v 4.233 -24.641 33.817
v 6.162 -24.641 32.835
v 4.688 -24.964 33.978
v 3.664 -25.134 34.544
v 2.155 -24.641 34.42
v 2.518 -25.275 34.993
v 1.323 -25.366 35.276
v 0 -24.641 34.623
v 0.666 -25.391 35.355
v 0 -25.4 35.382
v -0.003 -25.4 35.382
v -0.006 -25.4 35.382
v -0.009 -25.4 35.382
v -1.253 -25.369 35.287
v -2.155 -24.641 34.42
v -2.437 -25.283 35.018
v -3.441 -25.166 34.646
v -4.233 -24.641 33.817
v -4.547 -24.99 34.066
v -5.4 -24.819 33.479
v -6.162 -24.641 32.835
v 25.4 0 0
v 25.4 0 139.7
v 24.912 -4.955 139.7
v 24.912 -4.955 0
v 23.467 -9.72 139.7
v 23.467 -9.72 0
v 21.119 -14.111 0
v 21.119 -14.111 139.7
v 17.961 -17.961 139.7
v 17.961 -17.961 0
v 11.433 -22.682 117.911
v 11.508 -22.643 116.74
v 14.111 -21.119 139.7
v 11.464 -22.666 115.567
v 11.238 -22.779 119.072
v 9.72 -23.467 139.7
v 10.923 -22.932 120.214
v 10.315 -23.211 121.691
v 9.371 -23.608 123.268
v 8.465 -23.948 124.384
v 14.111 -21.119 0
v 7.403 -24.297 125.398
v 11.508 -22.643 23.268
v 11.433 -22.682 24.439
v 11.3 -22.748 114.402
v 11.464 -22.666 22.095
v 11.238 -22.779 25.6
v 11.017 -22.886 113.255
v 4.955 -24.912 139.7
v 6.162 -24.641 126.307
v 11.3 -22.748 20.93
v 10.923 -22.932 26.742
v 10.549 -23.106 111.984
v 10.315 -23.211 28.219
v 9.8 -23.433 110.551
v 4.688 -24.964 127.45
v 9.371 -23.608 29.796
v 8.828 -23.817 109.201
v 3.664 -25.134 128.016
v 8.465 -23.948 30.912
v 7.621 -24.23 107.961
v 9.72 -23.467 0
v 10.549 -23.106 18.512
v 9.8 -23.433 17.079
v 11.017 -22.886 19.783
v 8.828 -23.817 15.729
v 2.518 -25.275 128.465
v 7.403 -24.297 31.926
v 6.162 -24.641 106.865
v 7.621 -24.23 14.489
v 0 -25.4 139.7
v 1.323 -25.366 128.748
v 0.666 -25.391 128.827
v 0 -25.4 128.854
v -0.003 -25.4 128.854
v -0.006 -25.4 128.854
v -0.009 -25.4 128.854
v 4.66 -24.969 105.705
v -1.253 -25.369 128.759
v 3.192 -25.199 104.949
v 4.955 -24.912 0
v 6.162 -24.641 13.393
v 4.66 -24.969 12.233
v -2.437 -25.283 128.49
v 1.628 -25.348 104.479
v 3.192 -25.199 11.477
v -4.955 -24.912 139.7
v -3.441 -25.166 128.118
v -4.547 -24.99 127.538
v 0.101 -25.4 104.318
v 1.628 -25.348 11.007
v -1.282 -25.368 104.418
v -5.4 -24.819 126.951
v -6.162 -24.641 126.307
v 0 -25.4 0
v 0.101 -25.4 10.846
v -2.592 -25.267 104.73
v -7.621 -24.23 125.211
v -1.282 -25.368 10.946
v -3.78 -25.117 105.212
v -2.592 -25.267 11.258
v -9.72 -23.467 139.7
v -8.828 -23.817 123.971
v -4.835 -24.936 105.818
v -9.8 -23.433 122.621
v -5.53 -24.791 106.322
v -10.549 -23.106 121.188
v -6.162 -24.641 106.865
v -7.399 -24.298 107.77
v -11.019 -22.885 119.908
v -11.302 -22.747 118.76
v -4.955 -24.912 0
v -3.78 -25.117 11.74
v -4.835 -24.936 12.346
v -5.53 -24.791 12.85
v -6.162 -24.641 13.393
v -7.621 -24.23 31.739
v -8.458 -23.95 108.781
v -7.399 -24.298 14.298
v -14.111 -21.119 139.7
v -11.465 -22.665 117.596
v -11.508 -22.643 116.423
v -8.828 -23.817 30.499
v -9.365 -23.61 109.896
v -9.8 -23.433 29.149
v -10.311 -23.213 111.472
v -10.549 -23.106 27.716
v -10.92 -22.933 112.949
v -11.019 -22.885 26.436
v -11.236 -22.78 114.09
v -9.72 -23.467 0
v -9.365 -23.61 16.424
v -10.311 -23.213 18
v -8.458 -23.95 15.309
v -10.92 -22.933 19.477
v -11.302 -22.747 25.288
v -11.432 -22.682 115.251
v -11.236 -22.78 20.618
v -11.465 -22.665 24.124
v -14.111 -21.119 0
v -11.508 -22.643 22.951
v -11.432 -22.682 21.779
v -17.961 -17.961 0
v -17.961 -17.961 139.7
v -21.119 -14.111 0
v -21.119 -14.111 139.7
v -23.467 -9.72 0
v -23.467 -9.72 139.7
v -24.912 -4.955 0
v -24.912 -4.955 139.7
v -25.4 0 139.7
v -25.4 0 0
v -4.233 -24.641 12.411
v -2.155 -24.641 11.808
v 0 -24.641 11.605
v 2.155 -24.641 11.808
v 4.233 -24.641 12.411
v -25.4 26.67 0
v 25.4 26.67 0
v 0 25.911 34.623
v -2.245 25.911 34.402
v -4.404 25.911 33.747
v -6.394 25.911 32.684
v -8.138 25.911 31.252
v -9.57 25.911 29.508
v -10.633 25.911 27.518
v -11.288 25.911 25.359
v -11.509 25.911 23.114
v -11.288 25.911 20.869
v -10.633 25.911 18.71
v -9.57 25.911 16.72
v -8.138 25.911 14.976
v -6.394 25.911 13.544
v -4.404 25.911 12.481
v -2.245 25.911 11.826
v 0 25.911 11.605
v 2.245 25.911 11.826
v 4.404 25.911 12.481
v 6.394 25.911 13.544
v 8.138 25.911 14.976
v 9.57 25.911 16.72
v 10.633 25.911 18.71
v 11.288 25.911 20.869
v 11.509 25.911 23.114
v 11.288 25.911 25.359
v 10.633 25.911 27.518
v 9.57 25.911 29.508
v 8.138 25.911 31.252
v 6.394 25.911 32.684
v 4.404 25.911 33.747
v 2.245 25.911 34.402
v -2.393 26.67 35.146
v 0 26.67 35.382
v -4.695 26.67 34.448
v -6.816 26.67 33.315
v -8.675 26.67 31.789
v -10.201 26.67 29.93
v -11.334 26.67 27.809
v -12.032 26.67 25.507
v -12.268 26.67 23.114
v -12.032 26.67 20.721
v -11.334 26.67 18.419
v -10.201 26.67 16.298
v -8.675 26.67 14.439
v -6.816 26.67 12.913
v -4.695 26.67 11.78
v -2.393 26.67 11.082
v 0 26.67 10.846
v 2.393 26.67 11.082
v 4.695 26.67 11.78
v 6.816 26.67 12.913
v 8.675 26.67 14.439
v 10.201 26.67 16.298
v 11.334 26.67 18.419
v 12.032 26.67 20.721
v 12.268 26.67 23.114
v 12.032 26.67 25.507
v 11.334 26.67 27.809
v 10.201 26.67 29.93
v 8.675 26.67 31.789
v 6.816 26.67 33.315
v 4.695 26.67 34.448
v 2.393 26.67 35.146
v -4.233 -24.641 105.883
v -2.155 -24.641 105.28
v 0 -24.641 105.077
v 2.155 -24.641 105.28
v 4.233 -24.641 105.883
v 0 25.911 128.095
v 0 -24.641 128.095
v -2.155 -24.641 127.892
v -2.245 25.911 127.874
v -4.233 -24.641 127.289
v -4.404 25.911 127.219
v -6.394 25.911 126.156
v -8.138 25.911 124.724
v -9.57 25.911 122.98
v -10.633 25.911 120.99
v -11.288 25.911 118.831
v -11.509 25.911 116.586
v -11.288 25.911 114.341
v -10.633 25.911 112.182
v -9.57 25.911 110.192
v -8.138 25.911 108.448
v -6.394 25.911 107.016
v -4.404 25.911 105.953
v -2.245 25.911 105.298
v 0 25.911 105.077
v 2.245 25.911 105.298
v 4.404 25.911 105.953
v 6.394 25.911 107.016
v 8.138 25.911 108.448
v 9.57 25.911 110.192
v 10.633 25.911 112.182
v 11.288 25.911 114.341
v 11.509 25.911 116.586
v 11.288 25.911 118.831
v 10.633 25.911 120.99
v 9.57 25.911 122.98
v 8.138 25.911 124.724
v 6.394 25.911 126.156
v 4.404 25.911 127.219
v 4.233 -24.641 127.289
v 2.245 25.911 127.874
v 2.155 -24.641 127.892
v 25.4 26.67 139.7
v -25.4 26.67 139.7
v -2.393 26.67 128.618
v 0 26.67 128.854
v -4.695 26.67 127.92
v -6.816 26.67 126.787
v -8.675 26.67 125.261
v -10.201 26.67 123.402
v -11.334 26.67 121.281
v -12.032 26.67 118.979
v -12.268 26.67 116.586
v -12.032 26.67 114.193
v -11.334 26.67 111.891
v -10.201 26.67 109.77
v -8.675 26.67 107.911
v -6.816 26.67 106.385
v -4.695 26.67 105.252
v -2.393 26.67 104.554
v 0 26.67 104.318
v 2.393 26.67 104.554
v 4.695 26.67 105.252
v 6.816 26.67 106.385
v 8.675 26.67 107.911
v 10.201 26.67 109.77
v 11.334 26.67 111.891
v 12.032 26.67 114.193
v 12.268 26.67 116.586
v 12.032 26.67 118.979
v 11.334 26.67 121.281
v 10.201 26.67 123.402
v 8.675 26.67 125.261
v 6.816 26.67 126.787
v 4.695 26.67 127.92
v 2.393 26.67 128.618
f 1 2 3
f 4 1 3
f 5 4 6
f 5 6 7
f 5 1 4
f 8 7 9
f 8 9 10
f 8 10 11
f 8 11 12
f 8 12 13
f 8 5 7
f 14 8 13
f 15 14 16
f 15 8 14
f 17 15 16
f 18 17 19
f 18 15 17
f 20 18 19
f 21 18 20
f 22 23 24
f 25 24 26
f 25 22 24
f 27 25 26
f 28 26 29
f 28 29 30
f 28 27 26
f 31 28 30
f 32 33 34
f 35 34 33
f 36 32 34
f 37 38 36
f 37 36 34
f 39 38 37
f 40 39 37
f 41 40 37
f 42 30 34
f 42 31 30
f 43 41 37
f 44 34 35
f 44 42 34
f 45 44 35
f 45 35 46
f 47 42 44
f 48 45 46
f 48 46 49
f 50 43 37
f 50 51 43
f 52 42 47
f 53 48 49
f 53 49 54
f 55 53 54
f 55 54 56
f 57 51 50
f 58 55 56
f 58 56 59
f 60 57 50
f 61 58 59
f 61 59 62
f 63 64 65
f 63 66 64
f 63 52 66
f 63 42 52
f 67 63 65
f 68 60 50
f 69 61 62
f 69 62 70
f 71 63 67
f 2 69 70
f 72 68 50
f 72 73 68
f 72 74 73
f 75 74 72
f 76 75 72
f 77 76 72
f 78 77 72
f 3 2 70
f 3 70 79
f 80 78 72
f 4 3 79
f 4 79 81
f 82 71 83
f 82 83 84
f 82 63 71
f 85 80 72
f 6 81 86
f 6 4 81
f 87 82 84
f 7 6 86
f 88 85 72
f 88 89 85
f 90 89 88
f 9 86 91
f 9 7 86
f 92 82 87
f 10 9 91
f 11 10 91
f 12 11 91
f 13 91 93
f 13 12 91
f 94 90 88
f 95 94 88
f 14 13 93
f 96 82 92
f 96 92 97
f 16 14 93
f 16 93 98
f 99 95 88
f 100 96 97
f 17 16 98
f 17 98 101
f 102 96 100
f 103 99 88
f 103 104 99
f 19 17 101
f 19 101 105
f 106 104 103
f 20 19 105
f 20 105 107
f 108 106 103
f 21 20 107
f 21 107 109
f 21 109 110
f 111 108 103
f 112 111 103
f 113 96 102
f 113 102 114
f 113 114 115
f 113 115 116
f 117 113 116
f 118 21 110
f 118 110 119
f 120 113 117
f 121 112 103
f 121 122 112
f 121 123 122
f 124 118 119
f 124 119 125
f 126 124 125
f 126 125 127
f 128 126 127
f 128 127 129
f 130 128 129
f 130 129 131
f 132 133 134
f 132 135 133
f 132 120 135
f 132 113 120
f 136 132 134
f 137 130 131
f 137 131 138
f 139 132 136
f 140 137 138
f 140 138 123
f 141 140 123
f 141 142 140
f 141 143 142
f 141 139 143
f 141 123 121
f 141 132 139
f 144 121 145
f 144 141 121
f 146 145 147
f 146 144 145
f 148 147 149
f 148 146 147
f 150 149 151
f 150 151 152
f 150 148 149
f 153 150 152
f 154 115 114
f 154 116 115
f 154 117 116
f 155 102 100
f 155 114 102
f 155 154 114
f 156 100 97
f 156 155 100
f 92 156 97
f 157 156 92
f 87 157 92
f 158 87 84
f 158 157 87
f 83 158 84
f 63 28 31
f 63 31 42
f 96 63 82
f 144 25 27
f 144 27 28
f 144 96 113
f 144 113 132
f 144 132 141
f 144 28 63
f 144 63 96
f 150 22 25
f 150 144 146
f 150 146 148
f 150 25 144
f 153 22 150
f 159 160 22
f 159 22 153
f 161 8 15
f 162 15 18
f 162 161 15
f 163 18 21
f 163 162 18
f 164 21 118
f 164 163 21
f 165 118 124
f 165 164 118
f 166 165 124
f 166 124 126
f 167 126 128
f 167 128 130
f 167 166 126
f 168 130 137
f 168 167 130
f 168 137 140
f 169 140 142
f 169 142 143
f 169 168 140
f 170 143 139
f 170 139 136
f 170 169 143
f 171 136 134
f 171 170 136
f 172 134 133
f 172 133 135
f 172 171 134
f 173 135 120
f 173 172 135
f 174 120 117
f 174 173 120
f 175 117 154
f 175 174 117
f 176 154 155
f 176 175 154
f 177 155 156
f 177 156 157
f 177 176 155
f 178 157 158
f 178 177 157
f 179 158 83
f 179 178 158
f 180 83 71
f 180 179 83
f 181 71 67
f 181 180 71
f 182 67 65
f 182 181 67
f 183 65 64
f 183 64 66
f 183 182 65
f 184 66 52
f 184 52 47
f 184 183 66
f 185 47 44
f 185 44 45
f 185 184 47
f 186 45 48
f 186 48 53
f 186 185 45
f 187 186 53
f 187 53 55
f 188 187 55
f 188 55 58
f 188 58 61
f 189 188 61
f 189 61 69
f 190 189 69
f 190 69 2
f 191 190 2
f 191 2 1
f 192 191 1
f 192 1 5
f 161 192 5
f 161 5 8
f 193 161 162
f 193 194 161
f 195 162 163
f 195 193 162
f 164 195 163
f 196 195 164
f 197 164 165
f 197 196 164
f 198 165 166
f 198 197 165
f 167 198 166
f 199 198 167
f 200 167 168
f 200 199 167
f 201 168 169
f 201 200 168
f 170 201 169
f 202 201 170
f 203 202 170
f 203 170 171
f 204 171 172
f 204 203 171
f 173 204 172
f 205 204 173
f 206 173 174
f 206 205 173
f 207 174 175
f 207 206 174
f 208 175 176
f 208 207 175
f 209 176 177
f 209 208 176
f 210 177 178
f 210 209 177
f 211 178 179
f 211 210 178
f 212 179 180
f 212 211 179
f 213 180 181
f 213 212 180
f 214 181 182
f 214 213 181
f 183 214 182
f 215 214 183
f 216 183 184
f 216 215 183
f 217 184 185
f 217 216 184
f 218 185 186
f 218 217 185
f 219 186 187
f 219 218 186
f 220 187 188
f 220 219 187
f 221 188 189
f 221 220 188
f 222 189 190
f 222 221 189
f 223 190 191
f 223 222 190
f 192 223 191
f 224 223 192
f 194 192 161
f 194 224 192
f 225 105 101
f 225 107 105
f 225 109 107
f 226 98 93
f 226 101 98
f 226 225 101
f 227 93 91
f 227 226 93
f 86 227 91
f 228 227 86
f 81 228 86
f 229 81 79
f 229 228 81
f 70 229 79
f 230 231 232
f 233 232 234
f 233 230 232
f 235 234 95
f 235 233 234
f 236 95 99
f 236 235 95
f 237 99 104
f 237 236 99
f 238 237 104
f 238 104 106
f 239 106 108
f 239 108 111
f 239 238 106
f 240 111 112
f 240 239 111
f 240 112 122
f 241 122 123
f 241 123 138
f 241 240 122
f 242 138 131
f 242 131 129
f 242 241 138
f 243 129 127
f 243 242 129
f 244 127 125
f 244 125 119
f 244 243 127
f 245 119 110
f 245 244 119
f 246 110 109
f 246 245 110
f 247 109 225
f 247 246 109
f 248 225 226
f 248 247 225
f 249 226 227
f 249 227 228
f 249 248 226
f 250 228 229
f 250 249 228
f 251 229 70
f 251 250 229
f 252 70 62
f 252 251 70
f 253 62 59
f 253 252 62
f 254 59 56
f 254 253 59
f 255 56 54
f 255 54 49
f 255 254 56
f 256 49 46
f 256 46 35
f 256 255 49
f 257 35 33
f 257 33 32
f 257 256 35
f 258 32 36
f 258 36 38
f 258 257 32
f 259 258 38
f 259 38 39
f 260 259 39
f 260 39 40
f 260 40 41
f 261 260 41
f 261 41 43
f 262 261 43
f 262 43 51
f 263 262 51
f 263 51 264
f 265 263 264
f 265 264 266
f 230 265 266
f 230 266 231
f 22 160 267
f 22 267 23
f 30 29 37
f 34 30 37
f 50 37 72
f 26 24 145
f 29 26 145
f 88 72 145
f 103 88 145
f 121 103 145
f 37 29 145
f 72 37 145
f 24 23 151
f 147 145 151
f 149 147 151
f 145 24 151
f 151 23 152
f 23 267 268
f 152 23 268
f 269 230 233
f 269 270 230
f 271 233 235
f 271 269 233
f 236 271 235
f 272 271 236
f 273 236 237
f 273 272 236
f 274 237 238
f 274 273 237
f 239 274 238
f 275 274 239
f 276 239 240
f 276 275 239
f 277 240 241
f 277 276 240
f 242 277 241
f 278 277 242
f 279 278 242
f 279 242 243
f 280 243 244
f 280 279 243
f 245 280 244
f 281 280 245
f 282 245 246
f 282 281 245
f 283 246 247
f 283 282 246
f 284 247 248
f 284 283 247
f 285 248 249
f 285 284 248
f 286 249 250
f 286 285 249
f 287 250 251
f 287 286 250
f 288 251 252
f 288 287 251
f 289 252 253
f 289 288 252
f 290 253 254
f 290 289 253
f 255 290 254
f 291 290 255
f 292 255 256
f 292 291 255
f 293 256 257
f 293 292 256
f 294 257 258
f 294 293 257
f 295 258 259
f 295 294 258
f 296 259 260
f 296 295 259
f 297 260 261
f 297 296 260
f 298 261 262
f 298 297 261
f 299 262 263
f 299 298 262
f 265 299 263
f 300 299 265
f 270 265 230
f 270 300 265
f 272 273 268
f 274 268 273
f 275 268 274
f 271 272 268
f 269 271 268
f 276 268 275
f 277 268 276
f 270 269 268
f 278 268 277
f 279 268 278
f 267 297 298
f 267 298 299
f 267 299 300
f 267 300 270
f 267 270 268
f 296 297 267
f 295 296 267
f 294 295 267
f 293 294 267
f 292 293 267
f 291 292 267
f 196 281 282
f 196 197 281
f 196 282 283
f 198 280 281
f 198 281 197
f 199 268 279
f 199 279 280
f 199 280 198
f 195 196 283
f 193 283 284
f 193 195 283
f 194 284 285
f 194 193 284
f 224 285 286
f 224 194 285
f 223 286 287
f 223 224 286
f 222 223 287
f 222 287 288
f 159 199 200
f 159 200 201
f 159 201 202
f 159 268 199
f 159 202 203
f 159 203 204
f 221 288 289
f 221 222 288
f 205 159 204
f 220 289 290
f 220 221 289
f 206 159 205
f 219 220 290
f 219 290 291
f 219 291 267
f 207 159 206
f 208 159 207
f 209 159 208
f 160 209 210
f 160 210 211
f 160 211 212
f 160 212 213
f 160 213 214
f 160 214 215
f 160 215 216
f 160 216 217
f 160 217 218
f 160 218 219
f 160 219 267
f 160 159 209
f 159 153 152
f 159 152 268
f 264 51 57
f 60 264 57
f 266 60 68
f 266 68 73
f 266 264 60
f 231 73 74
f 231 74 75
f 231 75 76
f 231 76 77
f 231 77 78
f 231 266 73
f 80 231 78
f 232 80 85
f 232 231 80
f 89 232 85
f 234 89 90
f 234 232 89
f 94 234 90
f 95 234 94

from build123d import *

# Parameters (mm, degrees)
EXTRUDE1_DEPTH                            = 139.7
F_29_32_0_90625_DIAMETER_HOLE1_AT_2_COUNT = 2
F_29_32_0_90625_DIAMETER_HOLE1_AT_2_PITCH = 93.472


with BuildPart() as part:
    # Sketch1 → Extrude1 (new body)
    with BuildSketch(Plane.XY):
        with BuildLine():
            Line((-25.4, 0), (-25.4, 26.67))
            Line((-25.4, 26.67), (25.4, 26.67))
            Line((25.4, 26.67), (25.4, 0))
            ThreePointArc((25.4, 0), (0, -25.4), (-25.4, 0))
        make_face()
    extrude(amount=EXTRUDE1_DEPTH)

    # Sketch2 → 29/32 (0.90625) Diameter Hole1 (revolve, cut)
    with BuildSketch(Plane(origin=(0, 26.67, 23.114), x_dir=(0, 0, 1), z_dir=(1, 0, 0))):
        Polygon((0, 0), (0, 52.07), (12.2682, 52.07), (11.509375, 51.311175), (11.509375, 0.758825), (12.2682, 0), align=None)
    f_29_32_0_90625_diameter_hole1 = revolve(axis=Axis((0, 33.02, 23.114), (0, -1, 0)), mode=Mode.SUBTRACT)

    # 29/32 (0.90625) Diameter Hole1 at 2: 29/32 (0.90625) Diameter Hole1 ×2
    with Locations(*[(0, 0, i * F_29_32_0_90625_DIAMETER_HOLE1_AT_2_PITCH) for i in range(1, F_29_32_0_90625_DIAMETER_HOLE1_AT_2_COUNT)]):
        add(f_29_32_0_90625_diameter_hole1, mode=Mode.SUBTRACT)


solid = part.part
